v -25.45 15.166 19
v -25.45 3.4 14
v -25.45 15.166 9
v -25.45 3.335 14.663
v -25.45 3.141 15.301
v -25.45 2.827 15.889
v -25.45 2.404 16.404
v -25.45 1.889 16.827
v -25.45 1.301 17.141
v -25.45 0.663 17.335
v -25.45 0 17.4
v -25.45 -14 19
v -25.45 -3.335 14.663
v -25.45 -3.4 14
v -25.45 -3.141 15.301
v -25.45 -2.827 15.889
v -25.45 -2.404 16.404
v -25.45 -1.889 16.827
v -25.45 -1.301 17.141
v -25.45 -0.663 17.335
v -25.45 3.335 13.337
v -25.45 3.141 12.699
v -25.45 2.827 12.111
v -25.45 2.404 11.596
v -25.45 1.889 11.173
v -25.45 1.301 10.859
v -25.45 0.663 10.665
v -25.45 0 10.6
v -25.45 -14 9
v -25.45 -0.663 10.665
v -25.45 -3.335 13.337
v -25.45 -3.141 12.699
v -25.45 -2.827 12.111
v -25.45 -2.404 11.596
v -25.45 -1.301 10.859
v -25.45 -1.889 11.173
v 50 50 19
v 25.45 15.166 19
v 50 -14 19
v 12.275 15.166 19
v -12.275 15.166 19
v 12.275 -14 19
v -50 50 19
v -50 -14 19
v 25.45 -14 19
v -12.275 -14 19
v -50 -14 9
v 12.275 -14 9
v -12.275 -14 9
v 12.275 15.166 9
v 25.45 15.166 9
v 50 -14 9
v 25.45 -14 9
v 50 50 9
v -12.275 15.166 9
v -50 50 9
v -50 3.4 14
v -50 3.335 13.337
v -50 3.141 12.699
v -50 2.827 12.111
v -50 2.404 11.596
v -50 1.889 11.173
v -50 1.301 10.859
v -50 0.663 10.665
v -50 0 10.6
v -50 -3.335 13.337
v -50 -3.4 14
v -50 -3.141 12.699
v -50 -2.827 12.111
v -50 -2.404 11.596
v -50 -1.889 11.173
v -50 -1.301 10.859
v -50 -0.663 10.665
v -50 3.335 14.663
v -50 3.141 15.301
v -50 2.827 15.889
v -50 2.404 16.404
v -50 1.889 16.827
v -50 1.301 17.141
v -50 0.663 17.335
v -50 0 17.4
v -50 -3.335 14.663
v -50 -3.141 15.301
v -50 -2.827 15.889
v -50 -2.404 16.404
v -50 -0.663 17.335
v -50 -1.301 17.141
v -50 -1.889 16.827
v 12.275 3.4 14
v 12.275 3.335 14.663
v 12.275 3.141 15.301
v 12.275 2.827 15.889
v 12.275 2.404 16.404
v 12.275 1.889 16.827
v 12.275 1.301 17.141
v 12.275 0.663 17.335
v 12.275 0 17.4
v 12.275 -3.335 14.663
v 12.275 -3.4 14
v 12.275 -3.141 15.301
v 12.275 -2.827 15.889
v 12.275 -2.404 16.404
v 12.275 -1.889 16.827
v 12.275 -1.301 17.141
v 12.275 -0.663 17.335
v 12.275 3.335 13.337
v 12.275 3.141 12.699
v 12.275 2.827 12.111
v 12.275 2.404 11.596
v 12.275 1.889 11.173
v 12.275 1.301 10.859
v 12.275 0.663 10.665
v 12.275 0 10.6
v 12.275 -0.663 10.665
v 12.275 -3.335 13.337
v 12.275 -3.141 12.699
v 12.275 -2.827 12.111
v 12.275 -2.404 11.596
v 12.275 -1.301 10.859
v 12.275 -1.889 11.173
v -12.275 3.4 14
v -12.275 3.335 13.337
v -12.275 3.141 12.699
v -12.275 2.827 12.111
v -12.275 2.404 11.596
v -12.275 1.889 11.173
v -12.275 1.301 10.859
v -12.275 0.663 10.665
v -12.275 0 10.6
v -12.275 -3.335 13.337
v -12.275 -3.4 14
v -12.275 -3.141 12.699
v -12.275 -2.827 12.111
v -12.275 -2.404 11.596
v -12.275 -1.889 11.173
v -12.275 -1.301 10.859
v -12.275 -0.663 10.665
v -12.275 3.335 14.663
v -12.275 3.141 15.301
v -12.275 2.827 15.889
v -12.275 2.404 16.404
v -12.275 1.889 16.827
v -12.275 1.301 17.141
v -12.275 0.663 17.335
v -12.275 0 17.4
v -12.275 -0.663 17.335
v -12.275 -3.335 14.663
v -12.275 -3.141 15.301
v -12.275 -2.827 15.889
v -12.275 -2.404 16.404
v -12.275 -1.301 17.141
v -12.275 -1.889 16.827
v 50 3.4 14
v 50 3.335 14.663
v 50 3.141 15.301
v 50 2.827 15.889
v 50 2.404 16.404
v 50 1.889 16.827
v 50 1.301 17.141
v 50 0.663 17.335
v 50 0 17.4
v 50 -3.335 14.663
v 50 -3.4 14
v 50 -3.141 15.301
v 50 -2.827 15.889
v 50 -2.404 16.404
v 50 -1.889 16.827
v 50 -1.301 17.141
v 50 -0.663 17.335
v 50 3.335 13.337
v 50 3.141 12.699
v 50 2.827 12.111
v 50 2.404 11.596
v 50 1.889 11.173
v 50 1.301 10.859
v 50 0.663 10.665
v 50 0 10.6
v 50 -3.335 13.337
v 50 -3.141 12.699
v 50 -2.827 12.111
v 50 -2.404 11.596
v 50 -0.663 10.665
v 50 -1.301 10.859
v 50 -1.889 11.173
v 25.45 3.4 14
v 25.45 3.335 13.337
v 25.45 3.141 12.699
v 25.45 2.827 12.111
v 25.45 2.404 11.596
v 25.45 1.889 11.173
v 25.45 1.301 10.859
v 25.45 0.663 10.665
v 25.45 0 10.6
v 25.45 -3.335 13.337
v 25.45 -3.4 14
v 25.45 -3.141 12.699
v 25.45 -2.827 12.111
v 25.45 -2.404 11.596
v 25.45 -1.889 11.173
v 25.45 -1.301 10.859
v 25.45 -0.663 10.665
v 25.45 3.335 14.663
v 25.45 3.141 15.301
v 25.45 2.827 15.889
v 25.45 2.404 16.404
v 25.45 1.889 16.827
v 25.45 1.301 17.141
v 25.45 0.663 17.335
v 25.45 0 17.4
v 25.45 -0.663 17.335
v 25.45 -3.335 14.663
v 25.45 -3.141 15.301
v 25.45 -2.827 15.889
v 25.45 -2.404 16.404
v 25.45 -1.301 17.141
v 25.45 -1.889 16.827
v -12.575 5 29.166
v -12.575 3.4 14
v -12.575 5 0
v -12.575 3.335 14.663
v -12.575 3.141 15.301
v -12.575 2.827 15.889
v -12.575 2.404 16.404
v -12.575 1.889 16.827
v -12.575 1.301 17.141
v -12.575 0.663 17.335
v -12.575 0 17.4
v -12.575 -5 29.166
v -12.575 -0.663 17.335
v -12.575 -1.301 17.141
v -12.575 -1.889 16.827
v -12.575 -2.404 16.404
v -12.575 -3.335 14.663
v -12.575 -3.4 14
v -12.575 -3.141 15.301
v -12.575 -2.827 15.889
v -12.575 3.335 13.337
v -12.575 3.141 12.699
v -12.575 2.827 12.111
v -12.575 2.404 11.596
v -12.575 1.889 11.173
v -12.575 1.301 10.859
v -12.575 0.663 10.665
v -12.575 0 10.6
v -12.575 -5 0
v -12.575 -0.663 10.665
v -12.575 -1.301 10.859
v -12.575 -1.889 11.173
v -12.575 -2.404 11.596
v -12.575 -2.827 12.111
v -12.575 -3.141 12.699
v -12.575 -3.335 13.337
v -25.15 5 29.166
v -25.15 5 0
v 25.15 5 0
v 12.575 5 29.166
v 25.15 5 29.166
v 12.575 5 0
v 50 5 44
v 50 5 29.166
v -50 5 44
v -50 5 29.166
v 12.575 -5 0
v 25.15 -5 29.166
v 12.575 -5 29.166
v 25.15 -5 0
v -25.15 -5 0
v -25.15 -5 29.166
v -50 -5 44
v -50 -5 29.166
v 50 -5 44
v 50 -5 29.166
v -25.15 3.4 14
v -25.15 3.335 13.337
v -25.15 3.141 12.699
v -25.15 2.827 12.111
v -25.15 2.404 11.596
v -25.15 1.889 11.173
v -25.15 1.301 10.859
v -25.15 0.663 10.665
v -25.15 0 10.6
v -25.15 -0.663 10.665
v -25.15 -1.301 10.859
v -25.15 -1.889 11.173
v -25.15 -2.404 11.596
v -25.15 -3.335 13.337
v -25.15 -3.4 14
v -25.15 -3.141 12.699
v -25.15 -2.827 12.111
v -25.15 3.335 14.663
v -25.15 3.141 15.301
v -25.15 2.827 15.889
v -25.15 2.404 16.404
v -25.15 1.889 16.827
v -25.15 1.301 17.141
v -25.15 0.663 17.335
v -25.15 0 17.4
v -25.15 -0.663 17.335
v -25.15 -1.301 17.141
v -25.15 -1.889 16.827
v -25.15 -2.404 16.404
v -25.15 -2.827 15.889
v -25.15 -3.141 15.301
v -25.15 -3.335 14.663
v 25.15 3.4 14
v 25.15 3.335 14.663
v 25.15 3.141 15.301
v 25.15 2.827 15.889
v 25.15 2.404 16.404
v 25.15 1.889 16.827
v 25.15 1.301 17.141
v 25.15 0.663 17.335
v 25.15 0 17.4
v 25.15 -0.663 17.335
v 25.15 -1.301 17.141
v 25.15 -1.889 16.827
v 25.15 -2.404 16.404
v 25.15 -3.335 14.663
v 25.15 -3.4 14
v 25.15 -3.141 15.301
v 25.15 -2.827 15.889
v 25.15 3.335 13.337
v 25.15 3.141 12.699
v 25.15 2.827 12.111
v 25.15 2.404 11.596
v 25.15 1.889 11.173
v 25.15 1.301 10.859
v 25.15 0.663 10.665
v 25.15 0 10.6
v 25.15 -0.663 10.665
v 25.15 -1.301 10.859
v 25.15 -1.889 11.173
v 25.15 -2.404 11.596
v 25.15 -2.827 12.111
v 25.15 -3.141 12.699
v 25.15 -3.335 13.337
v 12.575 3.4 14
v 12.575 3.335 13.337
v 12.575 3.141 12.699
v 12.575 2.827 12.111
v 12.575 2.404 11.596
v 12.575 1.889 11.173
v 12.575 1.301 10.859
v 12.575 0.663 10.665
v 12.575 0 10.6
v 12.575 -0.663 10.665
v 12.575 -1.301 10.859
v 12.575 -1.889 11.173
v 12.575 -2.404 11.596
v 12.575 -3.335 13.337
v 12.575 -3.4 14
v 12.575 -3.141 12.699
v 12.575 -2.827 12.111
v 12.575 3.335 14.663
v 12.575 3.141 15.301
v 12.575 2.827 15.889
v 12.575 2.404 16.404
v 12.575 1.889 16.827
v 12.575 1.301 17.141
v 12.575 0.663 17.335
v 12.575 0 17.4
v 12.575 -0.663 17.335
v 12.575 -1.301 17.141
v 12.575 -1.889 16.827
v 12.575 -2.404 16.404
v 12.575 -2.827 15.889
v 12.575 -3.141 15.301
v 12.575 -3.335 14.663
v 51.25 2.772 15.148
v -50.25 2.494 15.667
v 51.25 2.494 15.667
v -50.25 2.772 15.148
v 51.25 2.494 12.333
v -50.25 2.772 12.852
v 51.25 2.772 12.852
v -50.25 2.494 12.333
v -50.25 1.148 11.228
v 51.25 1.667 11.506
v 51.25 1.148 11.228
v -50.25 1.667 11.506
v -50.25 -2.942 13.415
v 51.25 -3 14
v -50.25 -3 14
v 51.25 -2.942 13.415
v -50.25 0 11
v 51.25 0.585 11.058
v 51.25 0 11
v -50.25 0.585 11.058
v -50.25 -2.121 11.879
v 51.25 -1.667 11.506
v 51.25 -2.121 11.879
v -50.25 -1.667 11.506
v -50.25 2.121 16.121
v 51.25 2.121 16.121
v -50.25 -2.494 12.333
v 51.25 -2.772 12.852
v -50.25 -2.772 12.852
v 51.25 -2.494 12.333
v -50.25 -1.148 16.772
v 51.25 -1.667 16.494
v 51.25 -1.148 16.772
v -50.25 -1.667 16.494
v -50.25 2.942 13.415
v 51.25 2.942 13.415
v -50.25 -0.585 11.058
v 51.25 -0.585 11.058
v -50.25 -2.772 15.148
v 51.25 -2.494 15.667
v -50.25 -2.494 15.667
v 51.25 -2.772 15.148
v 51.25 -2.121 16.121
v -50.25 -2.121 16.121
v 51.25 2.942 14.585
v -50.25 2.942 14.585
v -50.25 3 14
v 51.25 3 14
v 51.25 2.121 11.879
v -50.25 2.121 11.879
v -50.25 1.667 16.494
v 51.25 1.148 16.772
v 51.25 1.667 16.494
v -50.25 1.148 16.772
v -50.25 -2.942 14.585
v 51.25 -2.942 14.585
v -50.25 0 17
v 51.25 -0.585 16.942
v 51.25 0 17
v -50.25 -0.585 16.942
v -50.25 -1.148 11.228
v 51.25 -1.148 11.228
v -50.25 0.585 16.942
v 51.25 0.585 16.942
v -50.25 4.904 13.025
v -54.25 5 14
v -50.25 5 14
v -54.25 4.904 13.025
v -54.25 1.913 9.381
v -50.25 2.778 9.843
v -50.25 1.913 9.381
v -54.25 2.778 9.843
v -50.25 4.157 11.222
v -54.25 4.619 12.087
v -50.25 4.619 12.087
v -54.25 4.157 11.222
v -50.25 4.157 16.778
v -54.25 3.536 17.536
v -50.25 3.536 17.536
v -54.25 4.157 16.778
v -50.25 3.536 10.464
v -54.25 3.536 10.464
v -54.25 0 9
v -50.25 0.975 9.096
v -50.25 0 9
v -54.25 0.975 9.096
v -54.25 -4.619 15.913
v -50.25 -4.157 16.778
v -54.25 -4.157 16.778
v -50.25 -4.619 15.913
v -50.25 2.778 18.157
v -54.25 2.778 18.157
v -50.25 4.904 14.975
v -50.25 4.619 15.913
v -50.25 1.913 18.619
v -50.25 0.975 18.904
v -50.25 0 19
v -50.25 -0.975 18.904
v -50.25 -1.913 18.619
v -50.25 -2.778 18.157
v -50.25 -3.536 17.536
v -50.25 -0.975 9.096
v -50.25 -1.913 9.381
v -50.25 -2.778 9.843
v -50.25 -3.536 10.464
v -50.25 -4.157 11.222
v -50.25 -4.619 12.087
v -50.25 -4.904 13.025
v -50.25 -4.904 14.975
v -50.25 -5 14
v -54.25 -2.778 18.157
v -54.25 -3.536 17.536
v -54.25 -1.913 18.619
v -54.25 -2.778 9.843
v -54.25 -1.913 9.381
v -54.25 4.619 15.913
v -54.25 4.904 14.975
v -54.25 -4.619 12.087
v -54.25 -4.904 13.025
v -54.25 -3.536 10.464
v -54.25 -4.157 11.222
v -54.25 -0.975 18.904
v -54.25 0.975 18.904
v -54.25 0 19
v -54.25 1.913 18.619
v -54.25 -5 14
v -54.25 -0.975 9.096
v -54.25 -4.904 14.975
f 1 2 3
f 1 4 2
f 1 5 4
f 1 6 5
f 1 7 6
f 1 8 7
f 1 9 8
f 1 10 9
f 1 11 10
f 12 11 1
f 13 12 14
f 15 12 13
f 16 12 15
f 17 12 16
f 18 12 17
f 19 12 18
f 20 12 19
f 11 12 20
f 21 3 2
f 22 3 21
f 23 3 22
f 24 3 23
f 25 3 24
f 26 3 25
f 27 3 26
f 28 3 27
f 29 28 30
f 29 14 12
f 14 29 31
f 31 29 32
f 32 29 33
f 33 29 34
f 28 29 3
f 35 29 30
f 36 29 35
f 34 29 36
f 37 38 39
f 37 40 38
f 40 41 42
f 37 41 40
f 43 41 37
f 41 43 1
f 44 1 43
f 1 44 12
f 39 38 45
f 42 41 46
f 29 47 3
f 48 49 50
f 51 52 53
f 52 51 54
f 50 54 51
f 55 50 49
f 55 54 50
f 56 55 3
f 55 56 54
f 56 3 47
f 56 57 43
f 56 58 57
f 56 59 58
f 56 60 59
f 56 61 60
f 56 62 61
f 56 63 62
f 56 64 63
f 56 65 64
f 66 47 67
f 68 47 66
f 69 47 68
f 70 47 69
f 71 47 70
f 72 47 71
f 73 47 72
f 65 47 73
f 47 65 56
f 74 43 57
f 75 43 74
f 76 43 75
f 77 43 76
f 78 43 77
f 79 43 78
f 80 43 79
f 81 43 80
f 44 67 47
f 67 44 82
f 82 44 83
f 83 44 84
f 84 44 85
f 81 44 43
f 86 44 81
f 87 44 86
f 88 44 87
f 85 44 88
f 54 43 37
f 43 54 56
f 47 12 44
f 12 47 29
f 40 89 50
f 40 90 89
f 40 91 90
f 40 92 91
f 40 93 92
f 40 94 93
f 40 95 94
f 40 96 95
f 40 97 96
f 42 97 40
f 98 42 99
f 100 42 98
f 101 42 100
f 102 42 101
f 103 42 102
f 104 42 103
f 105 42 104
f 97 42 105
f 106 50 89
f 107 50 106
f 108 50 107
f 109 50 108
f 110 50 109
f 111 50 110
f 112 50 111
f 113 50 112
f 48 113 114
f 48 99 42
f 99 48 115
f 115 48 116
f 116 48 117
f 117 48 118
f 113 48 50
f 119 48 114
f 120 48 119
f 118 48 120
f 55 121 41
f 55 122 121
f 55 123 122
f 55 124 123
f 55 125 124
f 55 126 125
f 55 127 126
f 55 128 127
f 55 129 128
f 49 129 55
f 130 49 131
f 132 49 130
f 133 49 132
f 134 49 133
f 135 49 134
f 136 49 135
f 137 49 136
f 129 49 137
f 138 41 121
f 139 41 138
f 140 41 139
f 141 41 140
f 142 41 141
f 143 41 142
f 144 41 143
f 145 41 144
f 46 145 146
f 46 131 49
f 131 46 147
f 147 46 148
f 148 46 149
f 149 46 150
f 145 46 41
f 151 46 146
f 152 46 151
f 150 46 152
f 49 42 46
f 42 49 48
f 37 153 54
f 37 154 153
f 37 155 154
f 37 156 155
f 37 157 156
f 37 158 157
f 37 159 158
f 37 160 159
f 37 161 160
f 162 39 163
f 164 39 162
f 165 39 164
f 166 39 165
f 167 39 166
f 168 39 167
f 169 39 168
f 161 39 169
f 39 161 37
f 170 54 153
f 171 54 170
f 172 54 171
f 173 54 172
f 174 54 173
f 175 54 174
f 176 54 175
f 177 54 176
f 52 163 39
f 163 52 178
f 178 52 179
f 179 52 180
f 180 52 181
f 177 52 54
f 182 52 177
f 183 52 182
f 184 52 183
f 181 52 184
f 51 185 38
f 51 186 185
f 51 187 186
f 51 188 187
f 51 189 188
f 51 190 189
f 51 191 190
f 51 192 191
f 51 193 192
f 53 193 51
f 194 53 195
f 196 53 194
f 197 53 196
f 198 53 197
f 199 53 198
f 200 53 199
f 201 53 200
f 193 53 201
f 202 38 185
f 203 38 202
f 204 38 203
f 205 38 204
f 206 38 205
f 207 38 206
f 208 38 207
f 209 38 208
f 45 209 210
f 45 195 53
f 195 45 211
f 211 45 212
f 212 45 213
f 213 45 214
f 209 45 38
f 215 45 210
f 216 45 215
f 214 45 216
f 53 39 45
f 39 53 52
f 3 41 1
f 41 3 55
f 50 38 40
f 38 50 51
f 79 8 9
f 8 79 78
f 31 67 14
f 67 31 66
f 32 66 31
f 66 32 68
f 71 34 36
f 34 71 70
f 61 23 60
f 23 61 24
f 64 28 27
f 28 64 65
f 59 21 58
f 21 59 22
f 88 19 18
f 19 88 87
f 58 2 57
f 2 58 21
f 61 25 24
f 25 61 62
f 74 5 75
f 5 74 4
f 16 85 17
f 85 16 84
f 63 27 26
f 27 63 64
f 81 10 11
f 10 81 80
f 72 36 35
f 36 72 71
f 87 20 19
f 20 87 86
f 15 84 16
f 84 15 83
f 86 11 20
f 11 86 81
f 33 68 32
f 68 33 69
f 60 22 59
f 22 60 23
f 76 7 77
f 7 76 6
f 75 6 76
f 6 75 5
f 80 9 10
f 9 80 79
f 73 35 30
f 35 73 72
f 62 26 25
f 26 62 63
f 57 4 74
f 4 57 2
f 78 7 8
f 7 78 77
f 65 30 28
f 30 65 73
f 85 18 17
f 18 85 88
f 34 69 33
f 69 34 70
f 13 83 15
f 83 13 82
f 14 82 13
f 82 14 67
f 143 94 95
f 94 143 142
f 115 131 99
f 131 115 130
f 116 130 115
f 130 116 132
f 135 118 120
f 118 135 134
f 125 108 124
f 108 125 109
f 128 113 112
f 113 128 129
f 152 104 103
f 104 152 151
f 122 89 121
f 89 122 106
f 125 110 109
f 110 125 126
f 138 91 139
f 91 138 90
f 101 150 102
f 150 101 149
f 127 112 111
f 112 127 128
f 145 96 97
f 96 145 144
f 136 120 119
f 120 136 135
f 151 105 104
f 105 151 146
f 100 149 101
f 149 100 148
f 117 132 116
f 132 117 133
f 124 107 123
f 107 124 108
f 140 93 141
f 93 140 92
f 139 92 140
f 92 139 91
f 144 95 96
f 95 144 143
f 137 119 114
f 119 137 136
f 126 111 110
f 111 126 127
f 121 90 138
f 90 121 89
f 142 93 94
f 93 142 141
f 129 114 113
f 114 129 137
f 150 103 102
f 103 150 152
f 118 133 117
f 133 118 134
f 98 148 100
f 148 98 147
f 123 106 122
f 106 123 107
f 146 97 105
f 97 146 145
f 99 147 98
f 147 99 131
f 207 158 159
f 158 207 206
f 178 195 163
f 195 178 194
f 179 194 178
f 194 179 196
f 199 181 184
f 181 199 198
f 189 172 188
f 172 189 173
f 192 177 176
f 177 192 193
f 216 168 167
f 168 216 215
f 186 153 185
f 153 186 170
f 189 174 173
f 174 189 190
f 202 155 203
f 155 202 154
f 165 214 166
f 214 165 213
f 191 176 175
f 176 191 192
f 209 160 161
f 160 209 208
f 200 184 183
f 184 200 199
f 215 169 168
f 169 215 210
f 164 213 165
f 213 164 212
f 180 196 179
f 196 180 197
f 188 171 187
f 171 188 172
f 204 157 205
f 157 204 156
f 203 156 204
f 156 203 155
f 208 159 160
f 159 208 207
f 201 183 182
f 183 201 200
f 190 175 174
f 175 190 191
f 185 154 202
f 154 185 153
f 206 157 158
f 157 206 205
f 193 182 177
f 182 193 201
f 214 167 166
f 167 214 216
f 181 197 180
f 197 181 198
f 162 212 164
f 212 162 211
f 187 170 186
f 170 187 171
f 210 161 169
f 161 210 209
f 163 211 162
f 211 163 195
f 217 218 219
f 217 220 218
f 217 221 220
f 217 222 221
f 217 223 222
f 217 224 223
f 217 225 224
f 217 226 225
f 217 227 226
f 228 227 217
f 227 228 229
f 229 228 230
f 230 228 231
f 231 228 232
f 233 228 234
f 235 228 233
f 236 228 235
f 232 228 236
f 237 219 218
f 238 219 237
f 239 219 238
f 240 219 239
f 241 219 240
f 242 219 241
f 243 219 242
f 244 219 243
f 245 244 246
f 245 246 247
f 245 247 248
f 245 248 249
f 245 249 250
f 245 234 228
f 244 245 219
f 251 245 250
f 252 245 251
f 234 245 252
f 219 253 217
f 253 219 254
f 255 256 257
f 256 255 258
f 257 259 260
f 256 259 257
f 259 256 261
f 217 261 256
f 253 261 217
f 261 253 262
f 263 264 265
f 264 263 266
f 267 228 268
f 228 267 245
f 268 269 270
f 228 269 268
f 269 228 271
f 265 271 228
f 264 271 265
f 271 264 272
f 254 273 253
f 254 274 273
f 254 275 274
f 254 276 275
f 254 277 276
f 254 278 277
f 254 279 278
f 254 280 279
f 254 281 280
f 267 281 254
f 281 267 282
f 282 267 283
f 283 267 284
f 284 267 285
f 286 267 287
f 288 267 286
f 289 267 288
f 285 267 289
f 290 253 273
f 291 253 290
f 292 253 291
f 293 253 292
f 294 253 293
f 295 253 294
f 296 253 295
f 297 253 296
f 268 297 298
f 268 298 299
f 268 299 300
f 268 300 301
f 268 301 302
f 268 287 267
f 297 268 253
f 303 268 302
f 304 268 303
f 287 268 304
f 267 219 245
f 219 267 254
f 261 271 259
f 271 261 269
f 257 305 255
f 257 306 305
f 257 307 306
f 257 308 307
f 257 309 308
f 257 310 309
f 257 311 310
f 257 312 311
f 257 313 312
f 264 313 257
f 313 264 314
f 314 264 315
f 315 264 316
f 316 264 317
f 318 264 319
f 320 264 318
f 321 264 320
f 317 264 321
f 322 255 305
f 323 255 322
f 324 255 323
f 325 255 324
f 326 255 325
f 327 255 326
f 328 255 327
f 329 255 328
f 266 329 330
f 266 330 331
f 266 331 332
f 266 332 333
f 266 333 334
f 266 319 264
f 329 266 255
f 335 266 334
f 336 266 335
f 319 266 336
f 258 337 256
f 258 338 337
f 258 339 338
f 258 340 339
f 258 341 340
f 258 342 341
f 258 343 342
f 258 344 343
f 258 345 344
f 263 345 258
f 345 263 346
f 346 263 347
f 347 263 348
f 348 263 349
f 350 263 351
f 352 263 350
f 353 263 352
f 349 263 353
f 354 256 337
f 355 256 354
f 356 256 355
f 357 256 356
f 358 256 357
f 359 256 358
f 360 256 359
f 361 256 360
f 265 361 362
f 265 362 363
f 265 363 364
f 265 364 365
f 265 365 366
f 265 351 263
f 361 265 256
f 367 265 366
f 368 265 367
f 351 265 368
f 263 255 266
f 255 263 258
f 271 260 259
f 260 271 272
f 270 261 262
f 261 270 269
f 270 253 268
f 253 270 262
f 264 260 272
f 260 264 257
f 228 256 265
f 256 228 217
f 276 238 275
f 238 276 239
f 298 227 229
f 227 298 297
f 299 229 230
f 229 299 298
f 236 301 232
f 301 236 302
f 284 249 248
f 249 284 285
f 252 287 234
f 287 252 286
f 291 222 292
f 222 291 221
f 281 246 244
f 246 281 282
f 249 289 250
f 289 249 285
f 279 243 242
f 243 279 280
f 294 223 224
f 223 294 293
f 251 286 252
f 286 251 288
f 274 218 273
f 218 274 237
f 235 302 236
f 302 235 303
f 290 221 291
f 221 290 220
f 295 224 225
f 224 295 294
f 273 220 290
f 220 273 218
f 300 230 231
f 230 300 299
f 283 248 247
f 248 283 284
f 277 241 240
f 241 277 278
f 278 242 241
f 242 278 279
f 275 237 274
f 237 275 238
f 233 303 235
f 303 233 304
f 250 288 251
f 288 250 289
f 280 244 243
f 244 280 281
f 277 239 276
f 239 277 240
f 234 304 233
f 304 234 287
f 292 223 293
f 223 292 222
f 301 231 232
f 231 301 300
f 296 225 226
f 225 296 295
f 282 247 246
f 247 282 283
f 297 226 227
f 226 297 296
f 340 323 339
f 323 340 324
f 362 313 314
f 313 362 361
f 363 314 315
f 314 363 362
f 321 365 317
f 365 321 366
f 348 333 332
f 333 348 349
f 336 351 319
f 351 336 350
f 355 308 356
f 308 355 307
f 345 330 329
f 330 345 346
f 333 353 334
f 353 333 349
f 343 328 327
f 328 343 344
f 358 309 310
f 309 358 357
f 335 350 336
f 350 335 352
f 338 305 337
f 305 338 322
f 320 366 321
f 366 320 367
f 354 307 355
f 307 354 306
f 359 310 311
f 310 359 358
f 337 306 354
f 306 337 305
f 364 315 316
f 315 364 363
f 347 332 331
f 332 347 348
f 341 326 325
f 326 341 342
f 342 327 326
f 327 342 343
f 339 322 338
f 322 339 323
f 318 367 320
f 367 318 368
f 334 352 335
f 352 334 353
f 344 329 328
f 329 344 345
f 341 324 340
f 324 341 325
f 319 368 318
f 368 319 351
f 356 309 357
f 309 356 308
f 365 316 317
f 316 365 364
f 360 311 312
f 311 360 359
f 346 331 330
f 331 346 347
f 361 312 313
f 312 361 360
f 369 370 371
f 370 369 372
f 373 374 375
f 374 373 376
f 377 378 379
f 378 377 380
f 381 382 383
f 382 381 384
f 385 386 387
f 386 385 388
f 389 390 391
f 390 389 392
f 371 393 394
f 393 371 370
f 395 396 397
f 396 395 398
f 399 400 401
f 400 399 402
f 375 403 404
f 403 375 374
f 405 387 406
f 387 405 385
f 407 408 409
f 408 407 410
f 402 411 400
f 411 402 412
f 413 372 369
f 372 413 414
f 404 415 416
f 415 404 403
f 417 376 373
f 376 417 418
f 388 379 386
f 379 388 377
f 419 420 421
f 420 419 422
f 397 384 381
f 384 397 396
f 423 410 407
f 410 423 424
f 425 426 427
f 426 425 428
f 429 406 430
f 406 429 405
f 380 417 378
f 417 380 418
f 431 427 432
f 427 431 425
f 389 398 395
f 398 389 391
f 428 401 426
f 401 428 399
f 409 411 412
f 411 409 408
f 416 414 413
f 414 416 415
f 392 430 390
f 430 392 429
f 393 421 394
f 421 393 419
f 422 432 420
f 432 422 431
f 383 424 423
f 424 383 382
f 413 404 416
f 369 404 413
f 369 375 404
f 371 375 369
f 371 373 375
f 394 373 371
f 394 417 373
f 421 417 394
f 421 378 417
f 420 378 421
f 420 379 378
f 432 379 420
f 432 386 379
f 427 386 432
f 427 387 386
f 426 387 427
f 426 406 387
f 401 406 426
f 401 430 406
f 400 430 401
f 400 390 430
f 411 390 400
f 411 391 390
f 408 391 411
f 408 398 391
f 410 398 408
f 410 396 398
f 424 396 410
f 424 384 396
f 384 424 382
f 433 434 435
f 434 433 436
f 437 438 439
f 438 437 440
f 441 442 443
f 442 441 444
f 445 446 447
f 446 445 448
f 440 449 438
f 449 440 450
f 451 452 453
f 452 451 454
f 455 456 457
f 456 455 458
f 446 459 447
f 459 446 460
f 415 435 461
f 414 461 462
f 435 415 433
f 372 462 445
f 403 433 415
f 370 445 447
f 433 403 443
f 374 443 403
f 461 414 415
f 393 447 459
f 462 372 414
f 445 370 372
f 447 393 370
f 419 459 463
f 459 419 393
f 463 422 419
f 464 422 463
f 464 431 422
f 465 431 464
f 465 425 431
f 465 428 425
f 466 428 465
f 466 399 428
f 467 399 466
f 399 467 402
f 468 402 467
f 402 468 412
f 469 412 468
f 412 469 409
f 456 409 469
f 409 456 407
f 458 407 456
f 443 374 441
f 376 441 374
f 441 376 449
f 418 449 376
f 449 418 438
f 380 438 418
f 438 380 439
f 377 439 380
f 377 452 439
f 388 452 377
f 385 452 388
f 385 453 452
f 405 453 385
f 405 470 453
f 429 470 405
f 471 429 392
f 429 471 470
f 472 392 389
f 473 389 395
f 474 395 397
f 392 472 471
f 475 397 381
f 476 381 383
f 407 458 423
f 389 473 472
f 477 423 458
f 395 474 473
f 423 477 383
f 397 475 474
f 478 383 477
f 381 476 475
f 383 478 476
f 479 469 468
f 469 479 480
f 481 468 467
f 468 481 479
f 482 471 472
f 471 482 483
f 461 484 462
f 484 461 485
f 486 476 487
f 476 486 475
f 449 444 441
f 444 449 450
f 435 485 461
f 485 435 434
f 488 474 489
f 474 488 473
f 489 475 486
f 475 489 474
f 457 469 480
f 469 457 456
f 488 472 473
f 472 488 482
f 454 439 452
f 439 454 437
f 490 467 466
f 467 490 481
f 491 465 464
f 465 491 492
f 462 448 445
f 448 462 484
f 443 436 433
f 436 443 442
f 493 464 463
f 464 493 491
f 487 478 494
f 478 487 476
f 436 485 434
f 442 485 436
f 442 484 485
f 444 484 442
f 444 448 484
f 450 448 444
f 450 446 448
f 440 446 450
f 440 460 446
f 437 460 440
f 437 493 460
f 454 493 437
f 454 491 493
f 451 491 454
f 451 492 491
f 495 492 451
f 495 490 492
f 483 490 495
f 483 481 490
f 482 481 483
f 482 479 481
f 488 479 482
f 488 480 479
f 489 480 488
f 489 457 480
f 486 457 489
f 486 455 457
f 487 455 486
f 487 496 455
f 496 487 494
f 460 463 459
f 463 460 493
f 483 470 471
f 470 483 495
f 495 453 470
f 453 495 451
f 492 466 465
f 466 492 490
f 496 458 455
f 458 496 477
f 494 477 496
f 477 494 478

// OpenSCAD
$fn = 32;

// ------------------------------------------------------------------------
// Butt hinge: hinge 100 mm, leaf swung 270 deg
// Every part is its own module, assembly() places every instance.
// ------------------------------------------------------------------------

// --- part 1 ---
module hinge_base() {
  difference() {
    union() {
      translate([-50, -14, -5]) cube([24.55, 64, 10]);
      translate([-12.275, -14, -5]) cube([24.55, 64, 10]);
      translate([25.45, -14, -5]) cube([24.55, 64, 10]);
      translate([-50, 15.166, -5]) cube([100, 34.834, 10]);
    }
    translate([-37.725, 0, 0]) rotate([0, 90, 0]) cylinder(h = 26.55, d = 6.8, center = true);
    translate([0, 0, 0]) rotate([0, 90, 0]) cylinder(h = 26.55, d = 6.8, center = true);
    translate([37.725, 0, 0]) rotate([0, 90, 0]) cylinder(h = 26.55, d = 6.8, center = true);
  }
}

// --- part 2 ---
module hinge_mover() {
  difference() {
    union() {
      translate([-25.15, -30, -5]) cube([12.575, 44, 10]);
      translate([12.575, -30, -5]) cube([12.575, 44, 10]);
      translate([-50, -30, -5]) cube([100, 14.834, 10]);
    }
    translate([-18.863, 0, 0]) rotate([0, 90, 0]) cylinder(h = 14.575, d = 6.8, center = true);
    translate([18.863, 0, 0]) rotate([0, 90, 0]) cylinder(h = 14.575, d = 6.8, center = true);
  }
}

// --- part 3 ---
module hinge_pin() {
  rotate([0, 90, 0]) cylinder(h = 102.5, d = 6, center = true);
  translate([-54.25, 0, 0]) rotate([0, 90, 0]) cylinder(h = 4, d = 10);
}

// --- assembly ---
module assembly() {
  color([0.80, 0.24, 0.20]) translate([0, 0, 14]) rotate([0, 0, 0]) hinge_base();
  color([0.20, 0.45, 0.75]) translate([0, 0, 14]) rotate([270, 0, 0]) hinge_mover();
  color([0.25, 0.62, 0.32]) translate([0, 0, 14]) rotate([0, 0, 0]) hinge_pin();
}

assembly();
